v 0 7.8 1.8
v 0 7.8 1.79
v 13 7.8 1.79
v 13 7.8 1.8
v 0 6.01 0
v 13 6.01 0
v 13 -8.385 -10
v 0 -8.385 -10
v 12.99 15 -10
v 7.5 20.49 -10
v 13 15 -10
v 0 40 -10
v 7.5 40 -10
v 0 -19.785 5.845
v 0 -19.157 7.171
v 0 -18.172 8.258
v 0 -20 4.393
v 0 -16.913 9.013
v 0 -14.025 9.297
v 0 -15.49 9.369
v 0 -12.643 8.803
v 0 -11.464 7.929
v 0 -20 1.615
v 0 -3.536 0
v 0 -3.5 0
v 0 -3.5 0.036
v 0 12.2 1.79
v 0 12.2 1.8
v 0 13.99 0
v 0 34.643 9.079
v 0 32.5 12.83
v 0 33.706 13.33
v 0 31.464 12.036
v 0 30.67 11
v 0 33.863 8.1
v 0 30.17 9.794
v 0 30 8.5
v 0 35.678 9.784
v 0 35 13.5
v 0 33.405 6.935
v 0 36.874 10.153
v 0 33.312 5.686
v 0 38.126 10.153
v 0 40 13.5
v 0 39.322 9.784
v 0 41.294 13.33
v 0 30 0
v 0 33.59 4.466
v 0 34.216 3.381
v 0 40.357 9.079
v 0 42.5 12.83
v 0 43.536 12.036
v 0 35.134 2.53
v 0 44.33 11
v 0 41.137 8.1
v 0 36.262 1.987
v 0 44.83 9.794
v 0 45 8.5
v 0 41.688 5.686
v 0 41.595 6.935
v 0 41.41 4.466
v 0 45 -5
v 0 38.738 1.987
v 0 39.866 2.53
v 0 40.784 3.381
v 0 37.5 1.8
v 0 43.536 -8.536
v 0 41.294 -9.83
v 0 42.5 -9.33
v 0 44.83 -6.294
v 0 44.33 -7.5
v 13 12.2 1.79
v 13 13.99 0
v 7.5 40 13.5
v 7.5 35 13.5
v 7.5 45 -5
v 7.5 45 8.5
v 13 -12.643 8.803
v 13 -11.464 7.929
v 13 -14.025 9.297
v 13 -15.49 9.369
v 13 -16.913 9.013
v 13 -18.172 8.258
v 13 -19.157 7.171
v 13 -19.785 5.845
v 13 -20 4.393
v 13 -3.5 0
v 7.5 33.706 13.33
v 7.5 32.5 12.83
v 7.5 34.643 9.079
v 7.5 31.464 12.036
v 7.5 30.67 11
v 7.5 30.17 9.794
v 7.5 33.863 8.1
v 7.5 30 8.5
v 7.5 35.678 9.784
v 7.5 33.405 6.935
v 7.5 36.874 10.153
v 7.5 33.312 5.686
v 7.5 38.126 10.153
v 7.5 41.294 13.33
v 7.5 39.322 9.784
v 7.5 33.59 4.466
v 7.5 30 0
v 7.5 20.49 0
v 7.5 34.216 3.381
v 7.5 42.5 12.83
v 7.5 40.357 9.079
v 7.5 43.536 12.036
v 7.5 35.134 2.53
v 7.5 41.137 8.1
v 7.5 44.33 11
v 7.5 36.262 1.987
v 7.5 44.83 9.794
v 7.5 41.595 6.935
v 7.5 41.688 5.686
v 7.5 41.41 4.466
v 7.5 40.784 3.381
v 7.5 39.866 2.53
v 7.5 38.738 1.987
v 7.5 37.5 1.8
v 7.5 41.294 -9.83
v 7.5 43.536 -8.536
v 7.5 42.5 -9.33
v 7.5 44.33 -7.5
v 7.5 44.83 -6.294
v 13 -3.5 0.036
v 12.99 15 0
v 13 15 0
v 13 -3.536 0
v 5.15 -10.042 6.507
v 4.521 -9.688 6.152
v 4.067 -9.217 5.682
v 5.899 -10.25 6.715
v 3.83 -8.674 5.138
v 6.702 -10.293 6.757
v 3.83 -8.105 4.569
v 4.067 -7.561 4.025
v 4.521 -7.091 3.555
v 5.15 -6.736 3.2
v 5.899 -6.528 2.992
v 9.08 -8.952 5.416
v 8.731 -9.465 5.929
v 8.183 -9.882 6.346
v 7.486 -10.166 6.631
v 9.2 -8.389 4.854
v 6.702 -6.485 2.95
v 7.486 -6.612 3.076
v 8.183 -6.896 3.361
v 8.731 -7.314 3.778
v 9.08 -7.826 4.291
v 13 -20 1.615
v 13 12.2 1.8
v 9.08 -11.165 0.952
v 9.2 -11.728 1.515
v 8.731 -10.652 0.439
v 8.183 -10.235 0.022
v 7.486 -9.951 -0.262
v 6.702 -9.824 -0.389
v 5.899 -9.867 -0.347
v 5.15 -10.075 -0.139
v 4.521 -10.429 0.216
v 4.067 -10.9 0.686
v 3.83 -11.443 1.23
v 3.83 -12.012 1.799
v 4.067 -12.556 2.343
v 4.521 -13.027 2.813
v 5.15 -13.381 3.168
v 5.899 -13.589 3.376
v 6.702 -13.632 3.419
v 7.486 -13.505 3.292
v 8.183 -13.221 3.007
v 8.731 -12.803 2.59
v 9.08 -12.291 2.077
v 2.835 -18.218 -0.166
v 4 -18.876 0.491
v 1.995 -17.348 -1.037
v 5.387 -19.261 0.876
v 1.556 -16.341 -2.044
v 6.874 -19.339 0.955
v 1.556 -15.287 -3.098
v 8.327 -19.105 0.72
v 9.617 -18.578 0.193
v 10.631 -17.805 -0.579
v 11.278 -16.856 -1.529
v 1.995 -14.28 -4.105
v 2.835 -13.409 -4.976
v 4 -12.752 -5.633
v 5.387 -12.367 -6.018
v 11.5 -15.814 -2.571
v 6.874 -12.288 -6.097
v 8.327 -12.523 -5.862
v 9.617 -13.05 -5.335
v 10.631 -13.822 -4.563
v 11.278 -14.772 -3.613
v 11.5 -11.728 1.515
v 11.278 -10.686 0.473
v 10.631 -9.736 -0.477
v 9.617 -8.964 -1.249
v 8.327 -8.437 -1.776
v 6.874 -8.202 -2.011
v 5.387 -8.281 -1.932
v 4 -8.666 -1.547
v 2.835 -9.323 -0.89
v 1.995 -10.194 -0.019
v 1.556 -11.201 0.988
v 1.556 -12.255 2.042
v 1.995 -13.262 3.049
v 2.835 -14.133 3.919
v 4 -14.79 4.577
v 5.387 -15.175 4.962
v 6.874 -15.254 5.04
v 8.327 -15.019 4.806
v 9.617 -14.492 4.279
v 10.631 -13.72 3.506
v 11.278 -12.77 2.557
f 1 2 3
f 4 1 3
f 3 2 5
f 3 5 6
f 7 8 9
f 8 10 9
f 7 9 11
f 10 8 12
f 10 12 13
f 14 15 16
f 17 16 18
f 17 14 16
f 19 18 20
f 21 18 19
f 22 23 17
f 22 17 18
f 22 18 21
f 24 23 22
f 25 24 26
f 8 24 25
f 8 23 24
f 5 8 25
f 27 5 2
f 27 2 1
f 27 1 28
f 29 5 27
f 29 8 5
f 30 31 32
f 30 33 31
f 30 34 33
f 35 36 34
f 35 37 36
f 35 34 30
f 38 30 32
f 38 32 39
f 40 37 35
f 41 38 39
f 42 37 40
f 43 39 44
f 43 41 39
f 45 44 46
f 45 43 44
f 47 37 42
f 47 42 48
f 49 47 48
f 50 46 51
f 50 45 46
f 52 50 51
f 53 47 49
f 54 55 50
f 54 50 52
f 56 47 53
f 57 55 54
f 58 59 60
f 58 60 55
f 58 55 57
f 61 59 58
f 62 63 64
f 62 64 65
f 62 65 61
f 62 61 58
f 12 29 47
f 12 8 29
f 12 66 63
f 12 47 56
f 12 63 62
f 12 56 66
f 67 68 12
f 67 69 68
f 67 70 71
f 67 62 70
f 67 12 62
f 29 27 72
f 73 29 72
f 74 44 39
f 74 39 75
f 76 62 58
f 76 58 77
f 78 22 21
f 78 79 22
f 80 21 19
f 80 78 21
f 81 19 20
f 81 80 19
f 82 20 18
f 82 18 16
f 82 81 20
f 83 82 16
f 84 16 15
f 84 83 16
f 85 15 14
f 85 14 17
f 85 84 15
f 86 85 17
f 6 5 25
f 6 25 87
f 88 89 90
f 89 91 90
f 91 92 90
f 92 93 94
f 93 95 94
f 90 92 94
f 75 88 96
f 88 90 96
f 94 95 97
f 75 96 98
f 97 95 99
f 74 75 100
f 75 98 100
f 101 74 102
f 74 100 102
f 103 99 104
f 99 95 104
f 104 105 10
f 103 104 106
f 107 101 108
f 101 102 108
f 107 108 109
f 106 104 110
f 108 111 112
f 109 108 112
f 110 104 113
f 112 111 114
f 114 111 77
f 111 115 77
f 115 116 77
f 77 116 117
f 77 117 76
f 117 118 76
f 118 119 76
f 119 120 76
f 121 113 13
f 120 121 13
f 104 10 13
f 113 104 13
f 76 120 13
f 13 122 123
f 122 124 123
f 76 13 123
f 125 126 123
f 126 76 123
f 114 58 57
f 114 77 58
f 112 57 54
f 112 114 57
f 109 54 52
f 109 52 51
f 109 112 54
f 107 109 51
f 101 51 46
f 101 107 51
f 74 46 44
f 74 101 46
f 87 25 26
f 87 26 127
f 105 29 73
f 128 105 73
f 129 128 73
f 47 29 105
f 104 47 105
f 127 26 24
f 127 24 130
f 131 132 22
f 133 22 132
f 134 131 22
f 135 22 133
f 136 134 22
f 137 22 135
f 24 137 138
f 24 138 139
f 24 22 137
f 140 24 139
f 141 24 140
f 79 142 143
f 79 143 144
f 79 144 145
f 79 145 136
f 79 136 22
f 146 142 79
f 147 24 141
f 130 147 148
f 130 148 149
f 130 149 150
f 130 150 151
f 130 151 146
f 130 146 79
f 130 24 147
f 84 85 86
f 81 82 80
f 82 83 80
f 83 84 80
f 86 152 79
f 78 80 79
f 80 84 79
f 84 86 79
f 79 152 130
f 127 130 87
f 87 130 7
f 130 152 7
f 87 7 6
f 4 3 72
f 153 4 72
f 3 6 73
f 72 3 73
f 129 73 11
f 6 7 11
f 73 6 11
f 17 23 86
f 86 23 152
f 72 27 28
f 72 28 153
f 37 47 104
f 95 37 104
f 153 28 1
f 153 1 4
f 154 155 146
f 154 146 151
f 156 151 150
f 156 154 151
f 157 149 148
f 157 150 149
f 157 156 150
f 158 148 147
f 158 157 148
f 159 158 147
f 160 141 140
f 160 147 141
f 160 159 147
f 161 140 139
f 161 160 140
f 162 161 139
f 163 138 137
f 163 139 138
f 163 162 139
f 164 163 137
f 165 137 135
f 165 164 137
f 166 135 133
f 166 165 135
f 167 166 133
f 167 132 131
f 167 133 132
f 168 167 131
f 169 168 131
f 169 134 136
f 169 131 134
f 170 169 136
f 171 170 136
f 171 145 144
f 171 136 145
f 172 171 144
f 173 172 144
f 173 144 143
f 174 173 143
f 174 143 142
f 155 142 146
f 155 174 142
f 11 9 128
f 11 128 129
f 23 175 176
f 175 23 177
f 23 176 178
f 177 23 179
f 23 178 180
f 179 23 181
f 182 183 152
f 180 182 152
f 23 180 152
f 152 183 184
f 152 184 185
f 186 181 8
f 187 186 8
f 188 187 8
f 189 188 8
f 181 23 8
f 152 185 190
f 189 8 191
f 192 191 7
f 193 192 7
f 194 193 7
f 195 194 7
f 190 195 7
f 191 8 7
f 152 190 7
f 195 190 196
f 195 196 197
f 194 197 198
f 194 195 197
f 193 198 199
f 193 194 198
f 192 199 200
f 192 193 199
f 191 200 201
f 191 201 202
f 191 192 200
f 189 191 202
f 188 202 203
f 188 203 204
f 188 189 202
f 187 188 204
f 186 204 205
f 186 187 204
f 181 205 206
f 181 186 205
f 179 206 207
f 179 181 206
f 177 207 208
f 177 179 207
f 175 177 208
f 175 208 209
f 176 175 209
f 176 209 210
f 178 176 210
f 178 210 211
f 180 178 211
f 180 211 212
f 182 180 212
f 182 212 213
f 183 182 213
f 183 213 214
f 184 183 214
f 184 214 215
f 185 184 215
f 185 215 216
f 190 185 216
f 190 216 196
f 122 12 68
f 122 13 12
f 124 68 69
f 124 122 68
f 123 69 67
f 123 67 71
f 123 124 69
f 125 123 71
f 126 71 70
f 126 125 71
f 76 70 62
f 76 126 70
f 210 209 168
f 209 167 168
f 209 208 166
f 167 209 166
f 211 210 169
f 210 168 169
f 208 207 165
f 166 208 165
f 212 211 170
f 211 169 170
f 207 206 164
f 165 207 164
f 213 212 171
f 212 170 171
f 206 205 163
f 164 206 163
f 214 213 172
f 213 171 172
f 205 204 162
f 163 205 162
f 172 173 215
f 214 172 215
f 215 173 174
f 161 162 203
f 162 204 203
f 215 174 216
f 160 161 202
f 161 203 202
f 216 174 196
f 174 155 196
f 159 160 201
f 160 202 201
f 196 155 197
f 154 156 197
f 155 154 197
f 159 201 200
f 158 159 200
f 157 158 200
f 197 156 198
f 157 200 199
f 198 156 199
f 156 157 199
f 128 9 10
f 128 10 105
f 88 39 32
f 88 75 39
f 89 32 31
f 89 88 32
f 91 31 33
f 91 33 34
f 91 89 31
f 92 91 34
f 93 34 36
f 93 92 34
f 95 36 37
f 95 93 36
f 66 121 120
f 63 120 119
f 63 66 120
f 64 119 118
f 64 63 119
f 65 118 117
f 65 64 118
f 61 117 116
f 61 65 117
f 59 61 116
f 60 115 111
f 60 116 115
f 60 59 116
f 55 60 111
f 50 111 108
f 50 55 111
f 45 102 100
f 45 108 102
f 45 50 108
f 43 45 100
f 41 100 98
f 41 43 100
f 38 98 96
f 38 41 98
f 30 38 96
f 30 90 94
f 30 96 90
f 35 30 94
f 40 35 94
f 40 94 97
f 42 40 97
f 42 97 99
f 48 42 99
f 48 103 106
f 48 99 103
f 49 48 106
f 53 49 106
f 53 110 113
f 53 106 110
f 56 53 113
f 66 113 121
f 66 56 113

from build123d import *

# Parameters (mm, degrees)
BOX013_W                    = 13
BOX013_H                    = 4.4
BOX013_DEPTH                = 1.8
CYLINDER007_R               = 5
CYLINDER007_DEPTH           = 6
CYLINDER007_PLACEMENT_ANGLE = 45
BOX011_W                    = 13
BOX011_H                    = 30
BOX011_DEPTH                = 50
BOX011_PLACEMENT_ANGLE      = 45
CYLINDER006_R               = 2.7
CYLINDER006_DEPTH           = 20
CYLINDER006_PLACEMENT_ANGLE = 45
BOX009_W                    = 13
BOX009_H                    = 10
BOX009_DEPTH                = 10
BOX008_W                    = 13
BOX008_H                    = 30
BOX008_DEPTH                = 50
BOX008_PLACEMENT_ANGLE      = 45
BOX007_W                    = 13
BOX007_H                    = 20
BOX007_DEPTH                = 30
CYLINDER005_R               = 4.2
CYLINDER005_DEPTH           = 10
BOX006_W                    = 7.5
BOX006_H                    = 15
BOX006_DEPTH                = 14
BOX005_W                    = 7.5
BOX005_H                    = 65
BOX005_DEPTH                = 10
BOX010_W                    = 5.5
BOX010_H                    = 35
BOX010_DEPTH                = 10
FILLET004_R                 = 5
CHAMFER001_SIZE             = 5.49
CHAMFER002_SIZE             = 1.79


with BuildPart() as cube009:
    # Box013 → Box013 (new body)
    with BuildSketch(Plane(origin=(0, 7.8, 0), x_dir=(1, 0, 0), z_dir=(0, 0, 1))):
        with Locations((6.5, 2.2)):
            Rectangle(BOX013_W, BOX013_H)
    extrude(amount=BOX013_DEPTH)


with BuildPart() as cylinder007:
    # Cylinder007 → Cylinder007 (new body)
    with BuildSketch(Plane.XY):
        Circle(CYLINDER007_R)
    extrude(amount=CYLINDER007_DEPTH)


with BuildPart() as cylinder007_1:
    # Cylinder007 placement: moved
    add(cylinder007.part.moved(Location((6.5, -15.970563, -2.727922))).rotate(Axis((6.5, -15.970563, -2.727922), (-1, 0, 0)), CYLINDER007_PLACEMENT_ANGLE))


with BuildPart() as box011:
    # Box011 → Box011 (new body)
    with BuildSketch(Plane.XY):
        with Locations((6.5, 15)):
            Rectangle(BOX011_W, BOX011_H)
    extrude(amount=BOX011_DEPTH)


with BuildPart() as box011_1:
    # Box011 placement: moved
    add(box011.part.moved(Location((0, -24.041631, -36.769553))).rotate(Axis((0, -24.041631, -36.769553), (1, 0, 0)), BOX011_PLACEMENT_ANGLE))


with BuildPart() as cylinder006:
    # Cylinder006 → Cylinder006 (new body)
    with BuildSketch(Plane.XY):
        Circle(CYLINDER006_R)
    extrude(amount=CYLINDER006_DEPTH)


with BuildPart() as cylinder006_1:
    # Cylinder006 placement: moved
    add(cylinder006.part.moved(Location((6.5, -22.334524, -9.091883))).rotate(Axis((6.5, -22.334524, -9.091883), (-1, 0, 0)), CYLINDER006_PLACEMENT_ANGLE))


with BuildPart() as cube008:
    # Box009 → Box009 (new body)
    with BuildSketch(Plane(origin=(0, -3.5, -0.5), x_dir=(1, 0, 0), z_dir=(0, 0, 1))):
        with Locations((6.5, 5)):
            Rectangle(BOX009_W, BOX009_H)
    extrude(amount=BOX009_DEPTH)


with BuildPart() as cube007:
    # Box008 → Box008 (new body)
    with BuildSketch(Plane.XY):
        with Locations((6.5, 15)):
            Rectangle(BOX008_W, BOX008_H)
    extrude(amount=BOX008_DEPTH)


with BuildPart() as cube007_1:
    # Box008 placement: moved
    add(cube007.part.moved(Location((0, -3.535534, 0))).rotate(Axis((0, -3.535534, 0), (1, 0, 0)), BOX008_PLACEMENT_ANGLE))


with BuildPart() as cut005:
    # Box007 → Box007 (new body)
    with BuildSketch(Plane(origin=(0, -20, -0.5), x_dir=(1, 0, 0), z_dir=(0, 0, 1))):
        with Locations((6.5, 10)):
            Rectangle(BOX007_W, BOX007_H)
    extrude(amount=BOX007_DEPTH)

    # Cut004: cut Cube007
    add(cube007_1.part, mode=Mode.SUBTRACT)

    # Cut005: cut Cube008-
    add(cube008.part, mode=Mode.SUBTRACT)


with BuildPart() as cylinder005:
    # Cylinder005 → Cylinder005 (new body)
    with BuildSketch(Plane(origin=(0, 37.5, 6), x_dir=(0, 0, -1), z_dir=(1, 0, 0))):
        Circle(CYLINDER005_R)
    extrude(amount=CYLINDER005_DEPTH)


with BuildPart() as cube005:
    # Box006 → Box006 (new body)
    with BuildSketch(Plane(origin=(0, 30, -0.5), x_dir=(1, 0, 0), z_dir=(0, 0, 1))):
        with Locations((3.75, 7.5)):
            Rectangle(BOX006_W, BOX006_H)
    extrude(amount=BOX006_DEPTH)


with BuildPart() as cut003:
    # Box005 → Box005 (new body)
    with BuildSketch(Plane(origin=(0, -20, -10), x_dir=(1, 0, 0), z_dir=(0, 0, 1))):
        with Locations((3.75, 32.5)):
            Rectangle(BOX005_W, BOX005_H)
    extrude(amount=BOX005_DEPTH)

    # Fusion003: union Cube005+
    add(cube005.part)

    # Cut003: cut Cylinder005-
    add(cylinder005.part, mode=Mode.SUBTRACT)


with BuildPart() as body001:
    # Box010 → Box010 (new body)
    with BuildSketch(Plane(origin=(7.5, -20, -10), x_dir=(1, 0, 0), z_dir=(0, 0, 1))):
        with Locations((2.75, 17.5)):
            Rectangle(BOX010_W, BOX010_H)
    extrude(amount=BOX010_DEPTH)

    # Fusion004: union Cut005, Cut003
    add(cut005.part)
    add(cut003.part)

    # Cut006: cut Cylinder006-
    add(cylinder006_1.part, mode=Mode.SUBTRACT)

    # Cut007: cut Box011
    add(box011_1.part, mode=Mode.SUBTRACT)

    # Cut009: cut Cylinder007
    add(cylinder007_1.part, mode=Mode.SUBTRACT)

    # Fusion005: union Cube009
    add(cube009.part)

    # Fillet004
    fillet004_edges = [body001.edges().sort_by_distance(p)[0] for p in [
        (3.75, 45, 13.5),
        (3.75, 30, 13.5),
        (6.5, -20, 16.464466),
        (3.75, 45, -10),
    ]]
    fillet(fillet004_edges, radius=FILLET004_R)

    # Chamfer001
    chamfer001_edges = [body001.edges().sort_by_distance(p)[0] for p in [
        (7.5, 15, -5),
    ]]
    chamfer(chamfer001_edges, length=CHAMFER001_SIZE)

    # Chamfer002
    chamfer002_edges = [body001.edges().sort_by_distance(p)[0] for p in [
        (10.25, 12.2, 0),
        (3.75, 12.2, 0),
        (3.75, 7.8, 0),
        (10.25, 7.8, 0),
    ]]
    chamfer(chamfer002_edges, length=CHAMFER002_SIZE)


solid = body001.part
